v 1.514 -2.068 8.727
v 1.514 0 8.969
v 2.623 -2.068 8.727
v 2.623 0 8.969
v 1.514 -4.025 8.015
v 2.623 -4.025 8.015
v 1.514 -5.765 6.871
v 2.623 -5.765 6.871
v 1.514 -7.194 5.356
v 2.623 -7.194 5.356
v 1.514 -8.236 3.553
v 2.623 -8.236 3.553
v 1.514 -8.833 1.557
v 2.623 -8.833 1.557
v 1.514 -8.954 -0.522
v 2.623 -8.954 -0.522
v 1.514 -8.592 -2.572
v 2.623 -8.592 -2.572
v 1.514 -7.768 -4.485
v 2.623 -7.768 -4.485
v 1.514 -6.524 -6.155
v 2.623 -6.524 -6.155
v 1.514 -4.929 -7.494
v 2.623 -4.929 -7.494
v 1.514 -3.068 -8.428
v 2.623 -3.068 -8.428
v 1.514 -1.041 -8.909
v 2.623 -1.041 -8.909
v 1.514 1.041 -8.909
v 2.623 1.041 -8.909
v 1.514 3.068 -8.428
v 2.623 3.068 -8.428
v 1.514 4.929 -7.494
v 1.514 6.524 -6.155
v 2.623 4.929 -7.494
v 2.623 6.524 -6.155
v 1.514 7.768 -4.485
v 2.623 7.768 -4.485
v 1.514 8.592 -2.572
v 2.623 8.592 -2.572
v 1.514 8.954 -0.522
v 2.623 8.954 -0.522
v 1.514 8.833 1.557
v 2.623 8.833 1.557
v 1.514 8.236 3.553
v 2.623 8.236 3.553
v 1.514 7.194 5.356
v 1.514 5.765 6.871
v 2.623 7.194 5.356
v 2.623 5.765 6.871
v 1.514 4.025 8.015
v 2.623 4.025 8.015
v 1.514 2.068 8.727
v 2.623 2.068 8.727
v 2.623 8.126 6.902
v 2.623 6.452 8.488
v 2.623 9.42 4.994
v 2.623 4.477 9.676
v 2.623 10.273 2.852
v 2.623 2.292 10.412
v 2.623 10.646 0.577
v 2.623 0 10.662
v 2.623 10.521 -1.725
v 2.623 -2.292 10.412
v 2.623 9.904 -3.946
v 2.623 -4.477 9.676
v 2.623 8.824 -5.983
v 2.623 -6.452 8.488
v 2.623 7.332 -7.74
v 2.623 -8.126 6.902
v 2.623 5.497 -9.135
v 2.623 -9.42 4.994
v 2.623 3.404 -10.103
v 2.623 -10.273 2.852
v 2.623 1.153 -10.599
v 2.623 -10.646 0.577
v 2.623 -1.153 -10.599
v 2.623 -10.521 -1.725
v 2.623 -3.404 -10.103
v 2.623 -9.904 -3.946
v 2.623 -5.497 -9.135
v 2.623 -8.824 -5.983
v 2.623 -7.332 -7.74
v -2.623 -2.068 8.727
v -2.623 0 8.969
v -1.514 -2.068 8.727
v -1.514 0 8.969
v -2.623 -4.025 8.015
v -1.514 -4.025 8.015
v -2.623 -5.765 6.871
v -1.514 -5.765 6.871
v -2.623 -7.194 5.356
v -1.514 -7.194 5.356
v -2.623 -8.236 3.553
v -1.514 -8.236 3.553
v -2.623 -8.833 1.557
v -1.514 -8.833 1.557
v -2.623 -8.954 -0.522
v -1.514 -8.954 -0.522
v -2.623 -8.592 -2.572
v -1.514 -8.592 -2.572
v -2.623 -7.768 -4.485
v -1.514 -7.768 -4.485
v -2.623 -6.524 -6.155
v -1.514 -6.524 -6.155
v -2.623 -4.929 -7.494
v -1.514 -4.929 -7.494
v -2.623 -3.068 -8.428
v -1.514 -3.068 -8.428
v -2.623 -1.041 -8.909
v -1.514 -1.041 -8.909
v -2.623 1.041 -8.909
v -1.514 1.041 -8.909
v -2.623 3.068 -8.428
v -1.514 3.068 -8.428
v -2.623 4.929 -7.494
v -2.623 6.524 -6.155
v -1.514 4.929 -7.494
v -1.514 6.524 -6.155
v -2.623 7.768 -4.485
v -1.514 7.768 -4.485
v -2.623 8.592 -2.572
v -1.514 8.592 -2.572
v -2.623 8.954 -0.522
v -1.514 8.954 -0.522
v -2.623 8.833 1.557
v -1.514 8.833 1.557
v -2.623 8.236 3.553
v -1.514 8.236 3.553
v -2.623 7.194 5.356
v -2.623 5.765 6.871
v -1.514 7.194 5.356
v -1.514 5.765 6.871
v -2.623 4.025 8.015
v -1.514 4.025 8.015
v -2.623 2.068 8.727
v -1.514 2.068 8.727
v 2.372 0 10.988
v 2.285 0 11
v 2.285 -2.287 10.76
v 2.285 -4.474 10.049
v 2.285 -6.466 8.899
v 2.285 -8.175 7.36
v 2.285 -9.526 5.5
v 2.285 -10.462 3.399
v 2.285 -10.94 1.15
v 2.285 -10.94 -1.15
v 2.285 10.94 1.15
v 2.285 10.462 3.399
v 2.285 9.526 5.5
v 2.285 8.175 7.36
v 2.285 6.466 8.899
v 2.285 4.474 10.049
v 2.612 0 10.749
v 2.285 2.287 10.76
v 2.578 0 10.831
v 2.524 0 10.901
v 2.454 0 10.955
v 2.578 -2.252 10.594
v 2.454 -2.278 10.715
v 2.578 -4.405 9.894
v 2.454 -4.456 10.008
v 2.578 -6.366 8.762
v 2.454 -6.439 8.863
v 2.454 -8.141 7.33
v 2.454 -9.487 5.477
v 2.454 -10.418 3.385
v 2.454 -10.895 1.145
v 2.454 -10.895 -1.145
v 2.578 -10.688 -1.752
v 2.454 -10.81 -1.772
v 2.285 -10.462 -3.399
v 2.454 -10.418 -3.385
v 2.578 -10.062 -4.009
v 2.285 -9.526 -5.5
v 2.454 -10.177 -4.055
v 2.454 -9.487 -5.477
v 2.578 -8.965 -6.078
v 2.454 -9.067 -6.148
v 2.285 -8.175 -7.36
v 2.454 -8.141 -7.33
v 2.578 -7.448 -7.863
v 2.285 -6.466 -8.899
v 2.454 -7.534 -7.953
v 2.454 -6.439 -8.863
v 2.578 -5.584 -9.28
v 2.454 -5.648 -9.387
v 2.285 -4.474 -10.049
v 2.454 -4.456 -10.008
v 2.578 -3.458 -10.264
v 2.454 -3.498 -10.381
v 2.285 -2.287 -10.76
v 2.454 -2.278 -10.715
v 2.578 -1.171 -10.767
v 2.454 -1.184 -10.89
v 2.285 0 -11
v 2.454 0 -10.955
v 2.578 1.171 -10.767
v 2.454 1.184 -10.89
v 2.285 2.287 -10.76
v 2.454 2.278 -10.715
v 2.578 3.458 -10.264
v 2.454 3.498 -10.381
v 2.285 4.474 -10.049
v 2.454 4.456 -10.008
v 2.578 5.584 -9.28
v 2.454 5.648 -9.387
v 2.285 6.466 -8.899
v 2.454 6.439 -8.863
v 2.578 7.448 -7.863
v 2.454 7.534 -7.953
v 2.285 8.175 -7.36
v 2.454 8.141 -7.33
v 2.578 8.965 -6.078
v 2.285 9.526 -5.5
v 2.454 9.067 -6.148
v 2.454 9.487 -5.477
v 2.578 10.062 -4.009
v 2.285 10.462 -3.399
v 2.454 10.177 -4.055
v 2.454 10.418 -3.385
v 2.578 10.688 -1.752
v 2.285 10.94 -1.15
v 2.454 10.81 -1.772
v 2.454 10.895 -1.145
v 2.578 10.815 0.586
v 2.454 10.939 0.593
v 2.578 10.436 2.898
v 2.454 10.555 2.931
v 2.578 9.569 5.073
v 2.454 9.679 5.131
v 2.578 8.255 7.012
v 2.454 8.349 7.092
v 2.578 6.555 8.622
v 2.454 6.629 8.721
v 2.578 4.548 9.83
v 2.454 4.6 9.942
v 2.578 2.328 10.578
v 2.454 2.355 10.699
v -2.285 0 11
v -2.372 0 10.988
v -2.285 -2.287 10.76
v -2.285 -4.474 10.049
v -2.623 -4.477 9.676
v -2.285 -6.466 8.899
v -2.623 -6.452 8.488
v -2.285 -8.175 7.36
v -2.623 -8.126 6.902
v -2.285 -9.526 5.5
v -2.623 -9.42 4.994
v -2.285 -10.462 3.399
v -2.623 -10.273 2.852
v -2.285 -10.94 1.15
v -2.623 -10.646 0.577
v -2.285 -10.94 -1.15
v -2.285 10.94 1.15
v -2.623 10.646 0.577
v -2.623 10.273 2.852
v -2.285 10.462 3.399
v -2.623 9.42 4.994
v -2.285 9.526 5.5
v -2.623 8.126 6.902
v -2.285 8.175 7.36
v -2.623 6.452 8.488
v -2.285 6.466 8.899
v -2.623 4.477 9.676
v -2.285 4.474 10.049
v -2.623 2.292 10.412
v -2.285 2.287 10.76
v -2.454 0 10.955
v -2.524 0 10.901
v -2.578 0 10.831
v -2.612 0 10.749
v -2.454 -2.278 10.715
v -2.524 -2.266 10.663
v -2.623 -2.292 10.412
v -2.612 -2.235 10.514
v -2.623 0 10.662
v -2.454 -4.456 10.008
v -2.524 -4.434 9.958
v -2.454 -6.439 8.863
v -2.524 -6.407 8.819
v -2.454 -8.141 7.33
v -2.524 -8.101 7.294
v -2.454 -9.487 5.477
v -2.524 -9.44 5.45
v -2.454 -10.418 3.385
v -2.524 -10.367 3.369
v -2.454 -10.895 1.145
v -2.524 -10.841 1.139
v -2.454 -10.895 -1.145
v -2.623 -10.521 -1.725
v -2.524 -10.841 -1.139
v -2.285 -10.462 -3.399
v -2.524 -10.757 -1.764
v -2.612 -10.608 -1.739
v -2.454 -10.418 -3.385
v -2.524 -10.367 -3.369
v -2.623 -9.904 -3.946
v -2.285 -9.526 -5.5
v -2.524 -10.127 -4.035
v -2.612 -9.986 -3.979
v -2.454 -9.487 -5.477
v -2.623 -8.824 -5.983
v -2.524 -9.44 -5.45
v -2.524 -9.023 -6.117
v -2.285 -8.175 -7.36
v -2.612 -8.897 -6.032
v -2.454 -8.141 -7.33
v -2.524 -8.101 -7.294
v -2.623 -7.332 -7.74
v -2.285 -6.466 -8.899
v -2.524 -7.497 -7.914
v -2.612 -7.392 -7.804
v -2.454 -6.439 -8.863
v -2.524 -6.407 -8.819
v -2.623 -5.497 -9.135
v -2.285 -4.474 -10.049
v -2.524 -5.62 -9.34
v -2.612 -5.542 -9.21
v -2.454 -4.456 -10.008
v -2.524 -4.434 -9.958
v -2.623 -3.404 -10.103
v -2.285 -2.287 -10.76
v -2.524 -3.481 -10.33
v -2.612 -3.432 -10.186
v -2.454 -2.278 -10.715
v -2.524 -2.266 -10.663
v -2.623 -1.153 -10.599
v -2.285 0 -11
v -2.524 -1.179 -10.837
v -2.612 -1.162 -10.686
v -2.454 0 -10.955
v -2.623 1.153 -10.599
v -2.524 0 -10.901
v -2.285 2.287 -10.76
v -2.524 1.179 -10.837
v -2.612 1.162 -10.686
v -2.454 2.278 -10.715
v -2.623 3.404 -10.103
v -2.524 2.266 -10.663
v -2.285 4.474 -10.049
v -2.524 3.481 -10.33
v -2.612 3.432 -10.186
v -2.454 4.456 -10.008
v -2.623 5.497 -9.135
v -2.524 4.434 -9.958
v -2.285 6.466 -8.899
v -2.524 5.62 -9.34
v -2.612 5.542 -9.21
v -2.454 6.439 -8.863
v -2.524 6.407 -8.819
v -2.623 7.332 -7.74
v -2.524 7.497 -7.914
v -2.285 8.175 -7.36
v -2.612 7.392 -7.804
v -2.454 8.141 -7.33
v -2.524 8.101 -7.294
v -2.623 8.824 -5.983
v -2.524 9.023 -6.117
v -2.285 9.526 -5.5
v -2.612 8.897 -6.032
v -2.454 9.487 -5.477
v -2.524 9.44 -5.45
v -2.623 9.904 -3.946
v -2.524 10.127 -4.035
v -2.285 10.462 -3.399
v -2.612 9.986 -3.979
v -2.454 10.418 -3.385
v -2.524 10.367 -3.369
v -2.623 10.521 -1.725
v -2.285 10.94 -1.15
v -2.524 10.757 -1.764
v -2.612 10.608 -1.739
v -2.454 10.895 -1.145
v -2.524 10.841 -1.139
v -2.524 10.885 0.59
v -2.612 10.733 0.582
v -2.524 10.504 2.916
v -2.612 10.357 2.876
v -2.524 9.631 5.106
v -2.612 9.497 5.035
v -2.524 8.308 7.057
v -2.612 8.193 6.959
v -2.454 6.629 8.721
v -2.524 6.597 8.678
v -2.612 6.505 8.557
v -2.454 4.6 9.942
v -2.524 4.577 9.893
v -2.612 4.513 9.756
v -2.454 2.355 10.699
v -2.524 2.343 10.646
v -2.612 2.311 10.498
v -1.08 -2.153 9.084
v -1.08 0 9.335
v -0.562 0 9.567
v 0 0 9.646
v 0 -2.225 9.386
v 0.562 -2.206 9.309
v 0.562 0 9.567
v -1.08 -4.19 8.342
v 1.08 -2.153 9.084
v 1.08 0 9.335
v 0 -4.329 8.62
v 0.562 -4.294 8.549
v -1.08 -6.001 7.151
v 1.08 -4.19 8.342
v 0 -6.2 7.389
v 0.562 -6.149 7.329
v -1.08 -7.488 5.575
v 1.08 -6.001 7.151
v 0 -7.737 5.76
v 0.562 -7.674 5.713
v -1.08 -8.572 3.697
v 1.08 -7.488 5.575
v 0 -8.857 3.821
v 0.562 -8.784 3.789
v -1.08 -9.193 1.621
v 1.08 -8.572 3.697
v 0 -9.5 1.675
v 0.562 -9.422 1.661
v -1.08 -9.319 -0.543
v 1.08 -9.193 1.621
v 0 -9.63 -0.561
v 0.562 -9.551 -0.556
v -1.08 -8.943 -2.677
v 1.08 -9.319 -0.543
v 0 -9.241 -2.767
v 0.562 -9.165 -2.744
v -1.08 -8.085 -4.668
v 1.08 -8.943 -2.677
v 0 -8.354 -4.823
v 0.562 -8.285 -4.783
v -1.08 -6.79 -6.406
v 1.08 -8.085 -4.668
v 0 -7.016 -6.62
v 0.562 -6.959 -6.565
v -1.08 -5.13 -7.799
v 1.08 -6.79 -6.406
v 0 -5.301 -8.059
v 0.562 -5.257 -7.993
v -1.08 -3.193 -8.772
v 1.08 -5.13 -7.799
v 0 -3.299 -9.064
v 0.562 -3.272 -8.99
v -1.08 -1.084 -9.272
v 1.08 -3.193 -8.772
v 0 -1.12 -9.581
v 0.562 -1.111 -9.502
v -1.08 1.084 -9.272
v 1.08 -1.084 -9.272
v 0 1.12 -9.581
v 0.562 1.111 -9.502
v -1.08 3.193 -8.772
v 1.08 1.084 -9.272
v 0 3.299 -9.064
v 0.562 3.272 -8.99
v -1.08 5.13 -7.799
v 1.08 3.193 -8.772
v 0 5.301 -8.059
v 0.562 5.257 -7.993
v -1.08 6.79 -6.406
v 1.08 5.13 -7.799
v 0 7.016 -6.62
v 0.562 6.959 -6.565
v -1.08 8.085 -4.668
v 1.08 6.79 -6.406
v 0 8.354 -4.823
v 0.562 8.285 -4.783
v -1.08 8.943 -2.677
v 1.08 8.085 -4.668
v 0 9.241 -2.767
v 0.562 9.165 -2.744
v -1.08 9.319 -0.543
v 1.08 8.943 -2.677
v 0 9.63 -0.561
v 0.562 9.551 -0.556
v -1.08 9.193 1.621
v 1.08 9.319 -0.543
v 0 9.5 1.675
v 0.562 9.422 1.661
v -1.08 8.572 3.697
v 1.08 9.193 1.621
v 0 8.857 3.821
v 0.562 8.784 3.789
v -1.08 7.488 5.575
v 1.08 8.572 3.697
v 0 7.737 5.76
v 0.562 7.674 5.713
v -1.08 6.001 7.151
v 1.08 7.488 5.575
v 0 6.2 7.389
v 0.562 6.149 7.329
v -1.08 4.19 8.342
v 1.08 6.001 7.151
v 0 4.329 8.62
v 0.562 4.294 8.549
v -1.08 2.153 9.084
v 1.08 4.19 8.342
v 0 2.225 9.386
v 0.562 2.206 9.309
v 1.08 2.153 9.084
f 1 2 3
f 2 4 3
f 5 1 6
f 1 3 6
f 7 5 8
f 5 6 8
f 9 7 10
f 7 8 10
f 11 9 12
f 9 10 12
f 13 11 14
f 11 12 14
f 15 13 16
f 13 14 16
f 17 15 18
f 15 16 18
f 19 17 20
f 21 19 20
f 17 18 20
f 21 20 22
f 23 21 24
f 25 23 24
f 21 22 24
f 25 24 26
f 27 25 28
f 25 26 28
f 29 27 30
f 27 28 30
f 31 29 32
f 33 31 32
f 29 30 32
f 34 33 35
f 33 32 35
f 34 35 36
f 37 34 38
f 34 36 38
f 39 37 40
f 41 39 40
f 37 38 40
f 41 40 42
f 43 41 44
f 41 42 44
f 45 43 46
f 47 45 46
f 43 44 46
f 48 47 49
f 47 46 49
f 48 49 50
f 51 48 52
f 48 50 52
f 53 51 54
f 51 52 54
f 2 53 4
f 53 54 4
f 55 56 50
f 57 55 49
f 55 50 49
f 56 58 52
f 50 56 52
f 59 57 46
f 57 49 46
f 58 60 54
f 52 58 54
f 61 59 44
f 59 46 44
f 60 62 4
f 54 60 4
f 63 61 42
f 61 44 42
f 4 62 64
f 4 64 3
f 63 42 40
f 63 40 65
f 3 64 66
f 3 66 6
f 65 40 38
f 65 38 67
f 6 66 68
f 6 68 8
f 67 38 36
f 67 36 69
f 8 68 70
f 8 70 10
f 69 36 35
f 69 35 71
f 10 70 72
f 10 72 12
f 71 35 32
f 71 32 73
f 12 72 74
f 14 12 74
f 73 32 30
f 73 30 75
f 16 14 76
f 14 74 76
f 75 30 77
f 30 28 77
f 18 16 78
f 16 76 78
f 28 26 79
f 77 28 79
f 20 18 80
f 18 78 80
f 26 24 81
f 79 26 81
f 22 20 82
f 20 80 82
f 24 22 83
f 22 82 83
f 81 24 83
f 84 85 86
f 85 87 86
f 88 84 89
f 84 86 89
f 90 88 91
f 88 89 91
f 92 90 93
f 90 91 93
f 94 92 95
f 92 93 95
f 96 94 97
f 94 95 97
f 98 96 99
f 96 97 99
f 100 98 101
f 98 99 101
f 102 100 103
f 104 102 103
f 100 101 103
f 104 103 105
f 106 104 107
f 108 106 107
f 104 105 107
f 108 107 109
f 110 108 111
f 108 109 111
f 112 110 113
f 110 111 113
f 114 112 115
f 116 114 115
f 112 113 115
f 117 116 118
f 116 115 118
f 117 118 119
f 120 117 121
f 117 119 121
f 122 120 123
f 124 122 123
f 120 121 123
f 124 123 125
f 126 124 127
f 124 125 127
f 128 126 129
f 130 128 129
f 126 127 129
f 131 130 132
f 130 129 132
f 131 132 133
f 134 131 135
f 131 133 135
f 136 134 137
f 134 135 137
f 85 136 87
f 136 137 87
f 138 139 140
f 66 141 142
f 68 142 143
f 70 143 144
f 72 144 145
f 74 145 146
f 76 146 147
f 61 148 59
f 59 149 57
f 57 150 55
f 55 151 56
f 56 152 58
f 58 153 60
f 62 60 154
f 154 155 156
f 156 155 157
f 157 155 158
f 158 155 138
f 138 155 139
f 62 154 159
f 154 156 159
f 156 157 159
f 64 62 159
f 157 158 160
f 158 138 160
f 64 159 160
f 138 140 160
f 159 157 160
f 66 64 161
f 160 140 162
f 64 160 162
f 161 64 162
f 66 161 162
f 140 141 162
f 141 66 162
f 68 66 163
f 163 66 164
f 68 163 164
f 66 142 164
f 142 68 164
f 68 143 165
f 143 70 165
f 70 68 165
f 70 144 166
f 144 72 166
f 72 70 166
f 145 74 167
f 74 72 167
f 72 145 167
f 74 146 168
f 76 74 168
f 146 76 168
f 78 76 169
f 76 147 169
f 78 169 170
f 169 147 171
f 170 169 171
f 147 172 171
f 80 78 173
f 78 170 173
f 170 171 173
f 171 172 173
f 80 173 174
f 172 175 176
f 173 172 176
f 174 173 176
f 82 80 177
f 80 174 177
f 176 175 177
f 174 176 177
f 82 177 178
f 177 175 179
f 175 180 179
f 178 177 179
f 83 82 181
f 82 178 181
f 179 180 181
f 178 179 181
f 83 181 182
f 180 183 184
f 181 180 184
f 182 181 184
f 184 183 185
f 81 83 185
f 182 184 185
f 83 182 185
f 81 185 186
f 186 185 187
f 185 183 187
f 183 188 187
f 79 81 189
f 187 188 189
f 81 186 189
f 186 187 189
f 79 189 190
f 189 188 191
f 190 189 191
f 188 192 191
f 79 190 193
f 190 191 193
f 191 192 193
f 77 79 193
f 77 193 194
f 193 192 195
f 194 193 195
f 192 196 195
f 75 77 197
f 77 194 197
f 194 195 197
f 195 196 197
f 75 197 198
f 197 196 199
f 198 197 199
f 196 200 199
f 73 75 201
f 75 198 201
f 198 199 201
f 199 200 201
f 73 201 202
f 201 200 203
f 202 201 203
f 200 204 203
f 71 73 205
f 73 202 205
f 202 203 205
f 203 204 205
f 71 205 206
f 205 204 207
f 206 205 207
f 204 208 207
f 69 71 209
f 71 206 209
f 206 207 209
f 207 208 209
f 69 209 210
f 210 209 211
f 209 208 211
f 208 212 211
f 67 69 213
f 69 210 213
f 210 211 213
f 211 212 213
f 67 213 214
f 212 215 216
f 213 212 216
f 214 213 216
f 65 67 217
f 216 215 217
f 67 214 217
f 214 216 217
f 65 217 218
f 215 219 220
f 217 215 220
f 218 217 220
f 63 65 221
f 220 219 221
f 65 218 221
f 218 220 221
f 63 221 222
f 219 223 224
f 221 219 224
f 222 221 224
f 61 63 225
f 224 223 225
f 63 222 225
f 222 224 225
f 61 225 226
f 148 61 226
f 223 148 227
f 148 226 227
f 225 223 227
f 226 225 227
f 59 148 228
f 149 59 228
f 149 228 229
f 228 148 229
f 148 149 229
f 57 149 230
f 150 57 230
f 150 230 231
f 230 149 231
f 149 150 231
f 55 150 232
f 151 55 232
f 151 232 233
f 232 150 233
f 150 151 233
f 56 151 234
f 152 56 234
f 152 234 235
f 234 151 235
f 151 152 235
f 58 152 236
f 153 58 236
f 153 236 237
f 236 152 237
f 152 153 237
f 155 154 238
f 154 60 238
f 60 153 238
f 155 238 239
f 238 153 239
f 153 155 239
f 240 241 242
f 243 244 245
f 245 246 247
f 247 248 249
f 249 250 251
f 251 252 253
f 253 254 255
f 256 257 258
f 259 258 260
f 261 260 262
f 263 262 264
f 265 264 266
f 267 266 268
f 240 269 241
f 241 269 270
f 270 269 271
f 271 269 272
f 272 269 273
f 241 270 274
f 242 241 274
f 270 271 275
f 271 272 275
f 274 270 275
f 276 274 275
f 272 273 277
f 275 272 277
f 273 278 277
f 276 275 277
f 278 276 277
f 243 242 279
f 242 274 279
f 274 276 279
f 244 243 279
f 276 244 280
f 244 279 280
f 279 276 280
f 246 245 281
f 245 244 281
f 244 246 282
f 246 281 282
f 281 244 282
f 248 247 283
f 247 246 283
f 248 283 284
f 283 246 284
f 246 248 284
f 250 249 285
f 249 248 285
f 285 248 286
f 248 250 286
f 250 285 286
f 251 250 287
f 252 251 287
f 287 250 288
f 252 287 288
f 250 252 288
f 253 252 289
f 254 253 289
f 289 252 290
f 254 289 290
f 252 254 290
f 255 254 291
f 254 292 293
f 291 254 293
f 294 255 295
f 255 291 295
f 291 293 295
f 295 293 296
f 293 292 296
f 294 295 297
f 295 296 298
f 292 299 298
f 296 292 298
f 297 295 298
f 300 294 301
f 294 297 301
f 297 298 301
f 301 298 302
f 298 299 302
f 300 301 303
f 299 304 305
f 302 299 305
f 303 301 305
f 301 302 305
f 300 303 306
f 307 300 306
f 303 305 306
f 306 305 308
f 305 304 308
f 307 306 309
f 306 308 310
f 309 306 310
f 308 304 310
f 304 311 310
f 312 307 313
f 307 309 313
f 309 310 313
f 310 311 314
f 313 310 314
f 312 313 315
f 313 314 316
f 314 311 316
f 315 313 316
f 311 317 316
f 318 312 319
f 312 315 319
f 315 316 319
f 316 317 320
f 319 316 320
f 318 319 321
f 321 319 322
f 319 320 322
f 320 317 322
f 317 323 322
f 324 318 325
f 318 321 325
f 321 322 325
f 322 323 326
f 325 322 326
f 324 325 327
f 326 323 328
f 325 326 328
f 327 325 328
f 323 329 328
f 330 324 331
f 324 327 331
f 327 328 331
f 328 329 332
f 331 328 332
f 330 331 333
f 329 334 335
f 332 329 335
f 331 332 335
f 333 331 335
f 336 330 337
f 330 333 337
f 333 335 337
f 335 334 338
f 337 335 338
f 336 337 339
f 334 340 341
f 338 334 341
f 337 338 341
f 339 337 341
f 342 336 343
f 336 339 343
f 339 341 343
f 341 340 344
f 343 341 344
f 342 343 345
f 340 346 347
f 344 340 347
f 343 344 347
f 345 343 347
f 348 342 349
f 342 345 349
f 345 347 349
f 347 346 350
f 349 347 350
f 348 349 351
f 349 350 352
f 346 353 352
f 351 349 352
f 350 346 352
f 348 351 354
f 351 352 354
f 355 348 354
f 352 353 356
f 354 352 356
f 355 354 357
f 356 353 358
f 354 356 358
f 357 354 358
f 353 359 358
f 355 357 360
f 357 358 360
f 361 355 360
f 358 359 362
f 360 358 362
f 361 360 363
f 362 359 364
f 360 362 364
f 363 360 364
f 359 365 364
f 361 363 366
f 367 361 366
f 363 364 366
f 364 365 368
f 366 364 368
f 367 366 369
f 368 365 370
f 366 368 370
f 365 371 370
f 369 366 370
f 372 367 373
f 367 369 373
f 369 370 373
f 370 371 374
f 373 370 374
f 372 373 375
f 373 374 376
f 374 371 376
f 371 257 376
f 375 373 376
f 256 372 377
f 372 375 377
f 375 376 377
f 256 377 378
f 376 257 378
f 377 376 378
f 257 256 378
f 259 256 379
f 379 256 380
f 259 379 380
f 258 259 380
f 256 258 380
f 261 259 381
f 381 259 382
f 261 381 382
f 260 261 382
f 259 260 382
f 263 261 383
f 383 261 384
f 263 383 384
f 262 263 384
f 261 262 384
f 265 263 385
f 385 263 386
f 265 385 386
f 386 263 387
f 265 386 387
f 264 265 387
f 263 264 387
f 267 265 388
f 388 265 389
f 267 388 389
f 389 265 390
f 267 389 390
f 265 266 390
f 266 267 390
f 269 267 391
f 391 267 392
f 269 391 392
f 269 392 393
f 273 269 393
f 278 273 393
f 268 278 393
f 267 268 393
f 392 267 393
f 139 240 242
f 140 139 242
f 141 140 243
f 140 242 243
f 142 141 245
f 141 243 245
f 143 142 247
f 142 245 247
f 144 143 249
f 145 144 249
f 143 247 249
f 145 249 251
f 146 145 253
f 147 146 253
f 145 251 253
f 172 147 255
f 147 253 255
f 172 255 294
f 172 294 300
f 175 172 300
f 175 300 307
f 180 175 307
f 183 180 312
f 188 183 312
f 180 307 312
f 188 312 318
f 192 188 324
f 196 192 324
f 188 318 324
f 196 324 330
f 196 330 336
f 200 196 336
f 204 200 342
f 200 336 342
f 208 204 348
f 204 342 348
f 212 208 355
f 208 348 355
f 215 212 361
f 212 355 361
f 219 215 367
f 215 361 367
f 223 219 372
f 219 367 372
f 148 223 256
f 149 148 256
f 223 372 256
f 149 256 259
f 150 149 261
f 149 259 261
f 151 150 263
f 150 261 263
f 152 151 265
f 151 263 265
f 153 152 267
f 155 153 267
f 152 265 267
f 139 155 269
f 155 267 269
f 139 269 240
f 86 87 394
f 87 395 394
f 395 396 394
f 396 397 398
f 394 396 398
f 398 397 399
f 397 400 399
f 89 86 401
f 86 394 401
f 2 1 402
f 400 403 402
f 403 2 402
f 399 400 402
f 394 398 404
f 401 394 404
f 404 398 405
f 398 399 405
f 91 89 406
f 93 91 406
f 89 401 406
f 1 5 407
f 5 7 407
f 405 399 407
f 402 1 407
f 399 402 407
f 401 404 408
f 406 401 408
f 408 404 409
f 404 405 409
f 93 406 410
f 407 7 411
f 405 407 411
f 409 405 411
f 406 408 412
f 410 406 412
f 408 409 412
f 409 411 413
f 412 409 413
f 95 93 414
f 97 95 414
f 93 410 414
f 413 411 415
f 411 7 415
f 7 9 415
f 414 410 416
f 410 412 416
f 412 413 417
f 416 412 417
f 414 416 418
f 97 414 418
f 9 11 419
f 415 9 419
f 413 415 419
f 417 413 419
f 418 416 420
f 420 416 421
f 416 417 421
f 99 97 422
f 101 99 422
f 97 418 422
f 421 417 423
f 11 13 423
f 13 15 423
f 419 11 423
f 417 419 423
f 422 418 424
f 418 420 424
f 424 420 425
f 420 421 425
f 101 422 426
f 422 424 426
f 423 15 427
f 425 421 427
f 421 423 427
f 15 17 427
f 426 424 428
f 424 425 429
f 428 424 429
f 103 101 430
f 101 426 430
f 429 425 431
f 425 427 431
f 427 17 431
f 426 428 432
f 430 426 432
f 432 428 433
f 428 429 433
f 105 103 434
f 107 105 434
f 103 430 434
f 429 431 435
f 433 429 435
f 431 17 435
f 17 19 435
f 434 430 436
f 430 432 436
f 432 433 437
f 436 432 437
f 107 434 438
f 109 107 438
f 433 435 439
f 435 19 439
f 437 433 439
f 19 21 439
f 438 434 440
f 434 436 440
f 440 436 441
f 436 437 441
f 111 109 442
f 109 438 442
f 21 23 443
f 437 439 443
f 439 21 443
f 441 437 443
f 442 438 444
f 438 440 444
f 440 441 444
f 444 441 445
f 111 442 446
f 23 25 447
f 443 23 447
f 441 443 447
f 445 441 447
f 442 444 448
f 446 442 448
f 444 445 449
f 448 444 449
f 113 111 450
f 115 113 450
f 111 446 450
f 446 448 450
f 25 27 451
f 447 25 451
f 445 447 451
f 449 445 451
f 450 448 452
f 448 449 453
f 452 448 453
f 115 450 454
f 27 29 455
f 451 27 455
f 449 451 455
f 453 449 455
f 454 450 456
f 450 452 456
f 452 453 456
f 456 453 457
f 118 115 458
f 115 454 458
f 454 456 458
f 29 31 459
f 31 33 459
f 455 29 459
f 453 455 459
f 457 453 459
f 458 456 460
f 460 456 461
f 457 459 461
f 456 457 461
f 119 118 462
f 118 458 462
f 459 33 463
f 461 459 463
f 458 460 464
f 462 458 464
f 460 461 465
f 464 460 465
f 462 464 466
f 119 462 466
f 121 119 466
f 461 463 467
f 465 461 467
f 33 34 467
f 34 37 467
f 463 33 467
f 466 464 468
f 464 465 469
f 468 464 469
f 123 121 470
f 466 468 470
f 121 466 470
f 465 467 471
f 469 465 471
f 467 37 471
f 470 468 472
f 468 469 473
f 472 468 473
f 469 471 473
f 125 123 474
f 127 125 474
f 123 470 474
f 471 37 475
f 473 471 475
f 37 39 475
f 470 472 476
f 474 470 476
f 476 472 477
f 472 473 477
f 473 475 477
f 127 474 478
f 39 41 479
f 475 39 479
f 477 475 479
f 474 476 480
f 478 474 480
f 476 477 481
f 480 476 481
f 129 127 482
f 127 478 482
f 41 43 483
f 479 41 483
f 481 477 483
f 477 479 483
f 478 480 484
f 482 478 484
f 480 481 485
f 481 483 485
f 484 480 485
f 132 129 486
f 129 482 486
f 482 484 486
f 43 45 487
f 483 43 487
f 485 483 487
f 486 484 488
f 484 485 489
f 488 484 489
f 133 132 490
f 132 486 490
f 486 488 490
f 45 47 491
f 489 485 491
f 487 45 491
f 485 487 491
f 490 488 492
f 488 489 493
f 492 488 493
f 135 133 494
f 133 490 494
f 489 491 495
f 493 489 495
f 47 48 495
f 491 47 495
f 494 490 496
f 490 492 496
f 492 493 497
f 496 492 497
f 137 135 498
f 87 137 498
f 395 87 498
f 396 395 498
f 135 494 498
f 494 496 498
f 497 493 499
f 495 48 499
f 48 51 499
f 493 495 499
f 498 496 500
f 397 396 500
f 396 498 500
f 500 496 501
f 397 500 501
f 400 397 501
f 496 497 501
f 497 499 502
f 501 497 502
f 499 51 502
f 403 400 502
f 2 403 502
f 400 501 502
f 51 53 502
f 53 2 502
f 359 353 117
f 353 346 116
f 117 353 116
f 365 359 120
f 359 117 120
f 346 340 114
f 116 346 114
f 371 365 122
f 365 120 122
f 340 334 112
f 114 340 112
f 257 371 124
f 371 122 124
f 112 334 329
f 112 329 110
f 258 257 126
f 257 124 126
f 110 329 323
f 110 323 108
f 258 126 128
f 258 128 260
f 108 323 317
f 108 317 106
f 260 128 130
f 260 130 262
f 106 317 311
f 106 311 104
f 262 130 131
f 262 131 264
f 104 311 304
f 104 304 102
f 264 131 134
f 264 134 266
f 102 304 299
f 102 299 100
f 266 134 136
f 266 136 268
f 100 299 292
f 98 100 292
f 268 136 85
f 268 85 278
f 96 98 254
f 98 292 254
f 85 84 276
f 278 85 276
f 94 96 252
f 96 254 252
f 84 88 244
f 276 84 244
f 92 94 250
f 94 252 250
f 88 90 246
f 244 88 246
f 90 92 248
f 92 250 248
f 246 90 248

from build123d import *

# Parameters (mm, degrees)
FILLET_1_R    = 2
SCALE_1_SCALE = 0.338461538
SCALE_2_SCALE = 0.5


with BuildPart() as part:
    # 草图1 → 旋转1 (revolve)
    with BuildSketch(Plane.XY, mode=Mode.PRIVATE) as revolve_1_sk:
        with BuildLine():
            Line((-15.5, 53), (-8.94427191, 53))
            ThreePointArc((-8.94427191, 53), (0, 57), (8.94427191, 53))
            Line((8.94427191, 53), (15.5, 53))
            Line((15.5, 53), (15.5, 65))
            Line((15.5, 65), (-15.5, 65))
            Line((-15.5, 65), (-15.5, 53))
        make_face()
    revolve(revolve_1_sk.sketch.rotate(Axis((0, 0, 0), (1, 0, 0)), 90), axis=Axis((0, 0, 0), (1, 0, 0)))

    # 圆角1
    fillet_1_edges = [part.edges().sort_by_distance(p)[0] for p in [
        (15.5, 0, -65),
        (-15.5, 0, -65),
    ]]
    fillet(fillet_1_edges, radius=FILLET_1_R)


with BuildPart() as part_1:
    # 缩放比例1: scaled about (0, 0, 0)
    add(part.part.scale(SCALE_1_SCALE))


with BuildPart() as part_2:
    # 缩放比例2: scaled about (0, 0, 0)
    add(part_1.part.scale(SCALE_2_SCALE))


solid = part_2.part
